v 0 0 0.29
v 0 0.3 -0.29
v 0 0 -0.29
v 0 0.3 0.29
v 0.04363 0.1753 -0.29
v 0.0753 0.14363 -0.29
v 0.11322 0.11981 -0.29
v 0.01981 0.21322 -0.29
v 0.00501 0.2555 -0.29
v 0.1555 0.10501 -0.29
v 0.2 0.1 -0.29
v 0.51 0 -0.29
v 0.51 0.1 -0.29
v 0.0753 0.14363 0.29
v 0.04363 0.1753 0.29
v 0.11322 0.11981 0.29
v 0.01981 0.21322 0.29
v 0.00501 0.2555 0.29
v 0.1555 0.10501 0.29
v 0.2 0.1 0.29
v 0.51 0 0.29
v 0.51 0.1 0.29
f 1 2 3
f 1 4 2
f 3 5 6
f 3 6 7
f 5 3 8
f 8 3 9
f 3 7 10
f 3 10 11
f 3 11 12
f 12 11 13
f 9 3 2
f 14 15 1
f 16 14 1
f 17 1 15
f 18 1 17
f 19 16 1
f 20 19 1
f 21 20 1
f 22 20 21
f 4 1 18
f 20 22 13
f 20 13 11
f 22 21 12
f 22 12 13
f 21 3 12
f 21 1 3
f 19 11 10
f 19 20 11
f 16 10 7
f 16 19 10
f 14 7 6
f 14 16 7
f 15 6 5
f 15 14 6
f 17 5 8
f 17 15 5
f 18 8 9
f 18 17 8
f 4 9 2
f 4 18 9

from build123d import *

# Parameters (mm, degrees)
BOSS_EXTRUDE1_DEPTH = 0.29


with BuildPart() as part:
    # Sketch1 → Boss-Extrude1 (new body, symmetric)
    with BuildSketch(Plane.XY):
        with BuildLine():
            Line((0, 0), (0.51, 0))
            Line((0.51, 0), (0.51, 0.1))
            Line((0.51, 0.1), (0.2, 0.1))
            ThreePointArc((0.2, 0.1), (0.058578644, 0.158578644), (0, 0.3))
            Line((0, 0.3), (0, 0))
        make_face()
    extrude(amount=BOSS_EXTRUDE1_DEPTH, both=True)


solid = part.part
